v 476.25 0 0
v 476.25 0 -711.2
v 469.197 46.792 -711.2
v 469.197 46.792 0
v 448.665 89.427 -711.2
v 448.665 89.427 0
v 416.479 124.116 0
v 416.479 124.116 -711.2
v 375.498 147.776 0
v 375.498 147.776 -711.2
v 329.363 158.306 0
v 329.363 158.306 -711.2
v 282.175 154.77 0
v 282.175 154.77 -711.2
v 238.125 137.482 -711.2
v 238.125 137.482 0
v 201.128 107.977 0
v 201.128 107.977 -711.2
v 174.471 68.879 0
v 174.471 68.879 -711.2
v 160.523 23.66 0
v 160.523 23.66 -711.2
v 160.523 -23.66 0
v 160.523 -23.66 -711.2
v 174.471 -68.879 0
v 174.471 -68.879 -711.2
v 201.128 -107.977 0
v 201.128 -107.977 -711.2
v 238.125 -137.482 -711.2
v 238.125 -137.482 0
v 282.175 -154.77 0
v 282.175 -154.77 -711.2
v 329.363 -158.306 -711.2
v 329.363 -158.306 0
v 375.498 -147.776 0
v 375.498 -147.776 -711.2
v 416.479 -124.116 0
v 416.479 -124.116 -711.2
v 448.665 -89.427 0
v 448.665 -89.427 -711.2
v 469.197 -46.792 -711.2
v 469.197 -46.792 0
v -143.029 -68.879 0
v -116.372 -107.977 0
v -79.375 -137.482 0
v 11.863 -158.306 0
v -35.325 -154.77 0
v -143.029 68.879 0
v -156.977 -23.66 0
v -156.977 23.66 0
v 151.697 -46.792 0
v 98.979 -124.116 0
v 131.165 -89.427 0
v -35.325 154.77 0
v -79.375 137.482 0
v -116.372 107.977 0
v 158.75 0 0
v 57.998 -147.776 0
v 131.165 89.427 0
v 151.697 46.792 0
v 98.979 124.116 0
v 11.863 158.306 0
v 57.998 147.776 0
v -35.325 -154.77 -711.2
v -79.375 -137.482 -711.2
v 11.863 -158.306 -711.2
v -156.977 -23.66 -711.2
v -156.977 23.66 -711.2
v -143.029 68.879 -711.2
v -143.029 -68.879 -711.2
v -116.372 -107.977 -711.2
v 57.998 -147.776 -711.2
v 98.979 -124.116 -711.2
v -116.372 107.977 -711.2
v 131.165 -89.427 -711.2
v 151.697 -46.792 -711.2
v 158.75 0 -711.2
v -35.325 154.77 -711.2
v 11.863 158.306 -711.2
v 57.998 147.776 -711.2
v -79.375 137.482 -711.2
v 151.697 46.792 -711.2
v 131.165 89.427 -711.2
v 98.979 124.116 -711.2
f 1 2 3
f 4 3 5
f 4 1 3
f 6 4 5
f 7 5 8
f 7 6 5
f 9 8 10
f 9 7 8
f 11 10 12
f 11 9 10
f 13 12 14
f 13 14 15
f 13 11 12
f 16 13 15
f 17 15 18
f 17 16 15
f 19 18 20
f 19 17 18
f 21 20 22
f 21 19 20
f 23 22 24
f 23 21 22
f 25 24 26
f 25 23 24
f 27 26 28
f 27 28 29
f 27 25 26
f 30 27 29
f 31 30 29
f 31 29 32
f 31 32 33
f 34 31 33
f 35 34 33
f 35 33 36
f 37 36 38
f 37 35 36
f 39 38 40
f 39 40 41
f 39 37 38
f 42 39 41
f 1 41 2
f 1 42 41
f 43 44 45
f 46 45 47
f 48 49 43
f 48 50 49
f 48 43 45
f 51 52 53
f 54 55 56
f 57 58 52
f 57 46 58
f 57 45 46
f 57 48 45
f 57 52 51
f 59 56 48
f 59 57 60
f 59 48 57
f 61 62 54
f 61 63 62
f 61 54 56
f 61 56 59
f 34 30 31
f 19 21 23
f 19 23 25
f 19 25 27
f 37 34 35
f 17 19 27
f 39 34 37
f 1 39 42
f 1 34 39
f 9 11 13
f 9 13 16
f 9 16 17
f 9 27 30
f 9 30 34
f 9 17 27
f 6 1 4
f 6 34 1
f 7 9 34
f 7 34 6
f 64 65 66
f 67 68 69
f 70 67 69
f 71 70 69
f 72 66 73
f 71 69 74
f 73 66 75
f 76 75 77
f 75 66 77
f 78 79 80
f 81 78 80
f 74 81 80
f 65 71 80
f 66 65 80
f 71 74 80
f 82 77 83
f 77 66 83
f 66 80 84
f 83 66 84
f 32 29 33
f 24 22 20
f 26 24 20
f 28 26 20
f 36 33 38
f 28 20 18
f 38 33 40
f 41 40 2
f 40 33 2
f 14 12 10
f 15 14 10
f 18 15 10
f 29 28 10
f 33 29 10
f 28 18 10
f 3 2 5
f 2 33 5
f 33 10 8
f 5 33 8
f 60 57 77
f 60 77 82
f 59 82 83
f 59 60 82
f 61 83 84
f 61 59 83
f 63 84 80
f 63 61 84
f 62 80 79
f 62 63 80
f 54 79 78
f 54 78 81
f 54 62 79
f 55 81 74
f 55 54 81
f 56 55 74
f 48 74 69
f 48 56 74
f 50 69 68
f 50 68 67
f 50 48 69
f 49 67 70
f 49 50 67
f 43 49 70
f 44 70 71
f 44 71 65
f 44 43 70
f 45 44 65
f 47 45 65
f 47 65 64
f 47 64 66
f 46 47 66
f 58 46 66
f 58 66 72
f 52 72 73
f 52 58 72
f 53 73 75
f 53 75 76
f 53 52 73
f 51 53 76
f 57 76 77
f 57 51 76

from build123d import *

# Parameters (mm, degrees)
F1_R     = 158.75
F2_DEPTH = 711.2
F4_R     = 158.75
F5_DEPTH = 711.2


with BuildPart() as f2:
    # F1 (on face) → F2 (new body)
    with BuildSketch(Plane.XY):
        Circle(F1_R)
    extrude(amount=-F2_DEPTH)

    # F3: F2 across plane


with BuildPart() as f2_1:
    add(f2.part)
    add(f2.part.mirror(Plane.YZ))


with BuildPart() as f5:
    # F4 (on face) → F5 (new body)
    with BuildSketch(Plane.XY):
        with Locations((317.5, 0)):
            Circle(F4_R)
    extrude(amount=-F5_DEPTH)


solid = Compound([f2_1.part, f5.part])
